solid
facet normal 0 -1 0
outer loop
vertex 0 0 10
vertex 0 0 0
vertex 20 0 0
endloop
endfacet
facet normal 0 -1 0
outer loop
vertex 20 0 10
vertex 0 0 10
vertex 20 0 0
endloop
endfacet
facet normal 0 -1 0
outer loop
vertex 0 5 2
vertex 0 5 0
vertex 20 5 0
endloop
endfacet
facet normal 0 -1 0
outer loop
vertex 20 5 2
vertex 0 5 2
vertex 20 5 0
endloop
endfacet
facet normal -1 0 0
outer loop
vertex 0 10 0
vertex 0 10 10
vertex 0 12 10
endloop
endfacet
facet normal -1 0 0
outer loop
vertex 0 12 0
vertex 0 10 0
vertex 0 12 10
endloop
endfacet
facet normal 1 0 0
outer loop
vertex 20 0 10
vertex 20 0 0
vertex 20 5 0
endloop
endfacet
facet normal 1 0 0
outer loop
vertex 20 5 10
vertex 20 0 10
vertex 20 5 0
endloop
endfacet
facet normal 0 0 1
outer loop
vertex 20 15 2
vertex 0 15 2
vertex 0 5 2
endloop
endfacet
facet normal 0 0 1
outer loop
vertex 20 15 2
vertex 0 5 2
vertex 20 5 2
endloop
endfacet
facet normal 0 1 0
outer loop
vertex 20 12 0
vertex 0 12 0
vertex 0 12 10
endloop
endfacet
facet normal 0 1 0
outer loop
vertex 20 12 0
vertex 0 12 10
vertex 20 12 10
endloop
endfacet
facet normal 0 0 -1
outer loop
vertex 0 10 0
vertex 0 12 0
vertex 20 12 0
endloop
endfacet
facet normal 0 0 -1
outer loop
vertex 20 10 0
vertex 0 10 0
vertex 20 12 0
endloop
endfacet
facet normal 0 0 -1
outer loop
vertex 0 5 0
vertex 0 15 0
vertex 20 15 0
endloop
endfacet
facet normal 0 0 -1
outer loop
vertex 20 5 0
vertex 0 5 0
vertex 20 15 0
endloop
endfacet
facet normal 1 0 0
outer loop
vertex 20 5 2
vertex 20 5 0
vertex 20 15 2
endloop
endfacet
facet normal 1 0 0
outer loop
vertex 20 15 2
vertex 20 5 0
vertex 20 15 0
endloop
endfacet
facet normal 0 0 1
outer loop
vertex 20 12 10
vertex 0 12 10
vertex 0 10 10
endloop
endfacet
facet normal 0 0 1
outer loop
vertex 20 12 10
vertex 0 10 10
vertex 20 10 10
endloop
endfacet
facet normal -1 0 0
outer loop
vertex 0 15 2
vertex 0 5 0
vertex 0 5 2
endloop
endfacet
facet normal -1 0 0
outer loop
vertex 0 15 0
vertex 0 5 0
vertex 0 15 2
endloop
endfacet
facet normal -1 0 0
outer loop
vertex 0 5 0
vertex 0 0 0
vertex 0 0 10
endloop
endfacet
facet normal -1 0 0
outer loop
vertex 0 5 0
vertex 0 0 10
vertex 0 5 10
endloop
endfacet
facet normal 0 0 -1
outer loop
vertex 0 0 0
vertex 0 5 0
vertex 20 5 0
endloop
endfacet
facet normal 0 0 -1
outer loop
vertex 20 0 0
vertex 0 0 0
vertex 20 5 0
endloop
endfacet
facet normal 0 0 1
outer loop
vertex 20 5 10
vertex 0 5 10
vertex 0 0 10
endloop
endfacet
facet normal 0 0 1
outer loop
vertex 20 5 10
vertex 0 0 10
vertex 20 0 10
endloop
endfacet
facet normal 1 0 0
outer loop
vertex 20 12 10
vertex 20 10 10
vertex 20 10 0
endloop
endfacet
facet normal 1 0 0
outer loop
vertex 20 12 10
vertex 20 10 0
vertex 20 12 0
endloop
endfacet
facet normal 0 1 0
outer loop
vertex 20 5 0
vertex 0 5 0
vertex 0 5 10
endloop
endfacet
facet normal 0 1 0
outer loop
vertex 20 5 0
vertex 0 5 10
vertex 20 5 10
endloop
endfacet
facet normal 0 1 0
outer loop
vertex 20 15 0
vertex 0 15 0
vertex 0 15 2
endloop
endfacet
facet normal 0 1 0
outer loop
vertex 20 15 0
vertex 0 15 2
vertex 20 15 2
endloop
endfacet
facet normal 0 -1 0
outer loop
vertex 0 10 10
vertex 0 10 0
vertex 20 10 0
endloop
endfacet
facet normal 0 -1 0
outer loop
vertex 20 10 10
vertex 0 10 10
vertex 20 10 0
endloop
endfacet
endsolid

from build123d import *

# Parameters (mm, degrees)
BOX_W        = 20
BOX_H        = 5
BOX_DEPTH    = 10
BOX001_W     = 20
BOX001_H     = 10
BOX001_DEPTH = 2
BOX002_W     = 20
BOX002_H     = 2
BOX002_DEPTH = 10


with BuildPart() as cube:
    # Box → Box (new body)
    with BuildSketch(Plane.XY):
        with Locations((10, 2.5)):
            Rectangle(BOX_W, BOX_H)
    extrude(amount=BOX_DEPTH)


with BuildPart() as cube001:
    # Box001 → Box001 (new body)
    with BuildSketch(Plane(origin=(0, 5, 0), x_dir=(1, 0, 0), z_dir=(0, 0, 1))):
        with Locations((10, 5)):
            Rectangle(BOX001_W, BOX001_H)
    extrude(amount=BOX001_DEPTH)


with BuildPart() as cube002:
    # Box002 → Box002 (new body)
    with BuildSketch(Plane(origin=(0, 10, 0), x_dir=(1, 0, 0), z_dir=(0, 0, 1))):
        with Locations((10, 1)):
            Rectangle(BOX002_W, BOX002_H)
    extrude(amount=BOX002_DEPTH)


solid = Compound([cube.part, cube001.part, cube002.part])
